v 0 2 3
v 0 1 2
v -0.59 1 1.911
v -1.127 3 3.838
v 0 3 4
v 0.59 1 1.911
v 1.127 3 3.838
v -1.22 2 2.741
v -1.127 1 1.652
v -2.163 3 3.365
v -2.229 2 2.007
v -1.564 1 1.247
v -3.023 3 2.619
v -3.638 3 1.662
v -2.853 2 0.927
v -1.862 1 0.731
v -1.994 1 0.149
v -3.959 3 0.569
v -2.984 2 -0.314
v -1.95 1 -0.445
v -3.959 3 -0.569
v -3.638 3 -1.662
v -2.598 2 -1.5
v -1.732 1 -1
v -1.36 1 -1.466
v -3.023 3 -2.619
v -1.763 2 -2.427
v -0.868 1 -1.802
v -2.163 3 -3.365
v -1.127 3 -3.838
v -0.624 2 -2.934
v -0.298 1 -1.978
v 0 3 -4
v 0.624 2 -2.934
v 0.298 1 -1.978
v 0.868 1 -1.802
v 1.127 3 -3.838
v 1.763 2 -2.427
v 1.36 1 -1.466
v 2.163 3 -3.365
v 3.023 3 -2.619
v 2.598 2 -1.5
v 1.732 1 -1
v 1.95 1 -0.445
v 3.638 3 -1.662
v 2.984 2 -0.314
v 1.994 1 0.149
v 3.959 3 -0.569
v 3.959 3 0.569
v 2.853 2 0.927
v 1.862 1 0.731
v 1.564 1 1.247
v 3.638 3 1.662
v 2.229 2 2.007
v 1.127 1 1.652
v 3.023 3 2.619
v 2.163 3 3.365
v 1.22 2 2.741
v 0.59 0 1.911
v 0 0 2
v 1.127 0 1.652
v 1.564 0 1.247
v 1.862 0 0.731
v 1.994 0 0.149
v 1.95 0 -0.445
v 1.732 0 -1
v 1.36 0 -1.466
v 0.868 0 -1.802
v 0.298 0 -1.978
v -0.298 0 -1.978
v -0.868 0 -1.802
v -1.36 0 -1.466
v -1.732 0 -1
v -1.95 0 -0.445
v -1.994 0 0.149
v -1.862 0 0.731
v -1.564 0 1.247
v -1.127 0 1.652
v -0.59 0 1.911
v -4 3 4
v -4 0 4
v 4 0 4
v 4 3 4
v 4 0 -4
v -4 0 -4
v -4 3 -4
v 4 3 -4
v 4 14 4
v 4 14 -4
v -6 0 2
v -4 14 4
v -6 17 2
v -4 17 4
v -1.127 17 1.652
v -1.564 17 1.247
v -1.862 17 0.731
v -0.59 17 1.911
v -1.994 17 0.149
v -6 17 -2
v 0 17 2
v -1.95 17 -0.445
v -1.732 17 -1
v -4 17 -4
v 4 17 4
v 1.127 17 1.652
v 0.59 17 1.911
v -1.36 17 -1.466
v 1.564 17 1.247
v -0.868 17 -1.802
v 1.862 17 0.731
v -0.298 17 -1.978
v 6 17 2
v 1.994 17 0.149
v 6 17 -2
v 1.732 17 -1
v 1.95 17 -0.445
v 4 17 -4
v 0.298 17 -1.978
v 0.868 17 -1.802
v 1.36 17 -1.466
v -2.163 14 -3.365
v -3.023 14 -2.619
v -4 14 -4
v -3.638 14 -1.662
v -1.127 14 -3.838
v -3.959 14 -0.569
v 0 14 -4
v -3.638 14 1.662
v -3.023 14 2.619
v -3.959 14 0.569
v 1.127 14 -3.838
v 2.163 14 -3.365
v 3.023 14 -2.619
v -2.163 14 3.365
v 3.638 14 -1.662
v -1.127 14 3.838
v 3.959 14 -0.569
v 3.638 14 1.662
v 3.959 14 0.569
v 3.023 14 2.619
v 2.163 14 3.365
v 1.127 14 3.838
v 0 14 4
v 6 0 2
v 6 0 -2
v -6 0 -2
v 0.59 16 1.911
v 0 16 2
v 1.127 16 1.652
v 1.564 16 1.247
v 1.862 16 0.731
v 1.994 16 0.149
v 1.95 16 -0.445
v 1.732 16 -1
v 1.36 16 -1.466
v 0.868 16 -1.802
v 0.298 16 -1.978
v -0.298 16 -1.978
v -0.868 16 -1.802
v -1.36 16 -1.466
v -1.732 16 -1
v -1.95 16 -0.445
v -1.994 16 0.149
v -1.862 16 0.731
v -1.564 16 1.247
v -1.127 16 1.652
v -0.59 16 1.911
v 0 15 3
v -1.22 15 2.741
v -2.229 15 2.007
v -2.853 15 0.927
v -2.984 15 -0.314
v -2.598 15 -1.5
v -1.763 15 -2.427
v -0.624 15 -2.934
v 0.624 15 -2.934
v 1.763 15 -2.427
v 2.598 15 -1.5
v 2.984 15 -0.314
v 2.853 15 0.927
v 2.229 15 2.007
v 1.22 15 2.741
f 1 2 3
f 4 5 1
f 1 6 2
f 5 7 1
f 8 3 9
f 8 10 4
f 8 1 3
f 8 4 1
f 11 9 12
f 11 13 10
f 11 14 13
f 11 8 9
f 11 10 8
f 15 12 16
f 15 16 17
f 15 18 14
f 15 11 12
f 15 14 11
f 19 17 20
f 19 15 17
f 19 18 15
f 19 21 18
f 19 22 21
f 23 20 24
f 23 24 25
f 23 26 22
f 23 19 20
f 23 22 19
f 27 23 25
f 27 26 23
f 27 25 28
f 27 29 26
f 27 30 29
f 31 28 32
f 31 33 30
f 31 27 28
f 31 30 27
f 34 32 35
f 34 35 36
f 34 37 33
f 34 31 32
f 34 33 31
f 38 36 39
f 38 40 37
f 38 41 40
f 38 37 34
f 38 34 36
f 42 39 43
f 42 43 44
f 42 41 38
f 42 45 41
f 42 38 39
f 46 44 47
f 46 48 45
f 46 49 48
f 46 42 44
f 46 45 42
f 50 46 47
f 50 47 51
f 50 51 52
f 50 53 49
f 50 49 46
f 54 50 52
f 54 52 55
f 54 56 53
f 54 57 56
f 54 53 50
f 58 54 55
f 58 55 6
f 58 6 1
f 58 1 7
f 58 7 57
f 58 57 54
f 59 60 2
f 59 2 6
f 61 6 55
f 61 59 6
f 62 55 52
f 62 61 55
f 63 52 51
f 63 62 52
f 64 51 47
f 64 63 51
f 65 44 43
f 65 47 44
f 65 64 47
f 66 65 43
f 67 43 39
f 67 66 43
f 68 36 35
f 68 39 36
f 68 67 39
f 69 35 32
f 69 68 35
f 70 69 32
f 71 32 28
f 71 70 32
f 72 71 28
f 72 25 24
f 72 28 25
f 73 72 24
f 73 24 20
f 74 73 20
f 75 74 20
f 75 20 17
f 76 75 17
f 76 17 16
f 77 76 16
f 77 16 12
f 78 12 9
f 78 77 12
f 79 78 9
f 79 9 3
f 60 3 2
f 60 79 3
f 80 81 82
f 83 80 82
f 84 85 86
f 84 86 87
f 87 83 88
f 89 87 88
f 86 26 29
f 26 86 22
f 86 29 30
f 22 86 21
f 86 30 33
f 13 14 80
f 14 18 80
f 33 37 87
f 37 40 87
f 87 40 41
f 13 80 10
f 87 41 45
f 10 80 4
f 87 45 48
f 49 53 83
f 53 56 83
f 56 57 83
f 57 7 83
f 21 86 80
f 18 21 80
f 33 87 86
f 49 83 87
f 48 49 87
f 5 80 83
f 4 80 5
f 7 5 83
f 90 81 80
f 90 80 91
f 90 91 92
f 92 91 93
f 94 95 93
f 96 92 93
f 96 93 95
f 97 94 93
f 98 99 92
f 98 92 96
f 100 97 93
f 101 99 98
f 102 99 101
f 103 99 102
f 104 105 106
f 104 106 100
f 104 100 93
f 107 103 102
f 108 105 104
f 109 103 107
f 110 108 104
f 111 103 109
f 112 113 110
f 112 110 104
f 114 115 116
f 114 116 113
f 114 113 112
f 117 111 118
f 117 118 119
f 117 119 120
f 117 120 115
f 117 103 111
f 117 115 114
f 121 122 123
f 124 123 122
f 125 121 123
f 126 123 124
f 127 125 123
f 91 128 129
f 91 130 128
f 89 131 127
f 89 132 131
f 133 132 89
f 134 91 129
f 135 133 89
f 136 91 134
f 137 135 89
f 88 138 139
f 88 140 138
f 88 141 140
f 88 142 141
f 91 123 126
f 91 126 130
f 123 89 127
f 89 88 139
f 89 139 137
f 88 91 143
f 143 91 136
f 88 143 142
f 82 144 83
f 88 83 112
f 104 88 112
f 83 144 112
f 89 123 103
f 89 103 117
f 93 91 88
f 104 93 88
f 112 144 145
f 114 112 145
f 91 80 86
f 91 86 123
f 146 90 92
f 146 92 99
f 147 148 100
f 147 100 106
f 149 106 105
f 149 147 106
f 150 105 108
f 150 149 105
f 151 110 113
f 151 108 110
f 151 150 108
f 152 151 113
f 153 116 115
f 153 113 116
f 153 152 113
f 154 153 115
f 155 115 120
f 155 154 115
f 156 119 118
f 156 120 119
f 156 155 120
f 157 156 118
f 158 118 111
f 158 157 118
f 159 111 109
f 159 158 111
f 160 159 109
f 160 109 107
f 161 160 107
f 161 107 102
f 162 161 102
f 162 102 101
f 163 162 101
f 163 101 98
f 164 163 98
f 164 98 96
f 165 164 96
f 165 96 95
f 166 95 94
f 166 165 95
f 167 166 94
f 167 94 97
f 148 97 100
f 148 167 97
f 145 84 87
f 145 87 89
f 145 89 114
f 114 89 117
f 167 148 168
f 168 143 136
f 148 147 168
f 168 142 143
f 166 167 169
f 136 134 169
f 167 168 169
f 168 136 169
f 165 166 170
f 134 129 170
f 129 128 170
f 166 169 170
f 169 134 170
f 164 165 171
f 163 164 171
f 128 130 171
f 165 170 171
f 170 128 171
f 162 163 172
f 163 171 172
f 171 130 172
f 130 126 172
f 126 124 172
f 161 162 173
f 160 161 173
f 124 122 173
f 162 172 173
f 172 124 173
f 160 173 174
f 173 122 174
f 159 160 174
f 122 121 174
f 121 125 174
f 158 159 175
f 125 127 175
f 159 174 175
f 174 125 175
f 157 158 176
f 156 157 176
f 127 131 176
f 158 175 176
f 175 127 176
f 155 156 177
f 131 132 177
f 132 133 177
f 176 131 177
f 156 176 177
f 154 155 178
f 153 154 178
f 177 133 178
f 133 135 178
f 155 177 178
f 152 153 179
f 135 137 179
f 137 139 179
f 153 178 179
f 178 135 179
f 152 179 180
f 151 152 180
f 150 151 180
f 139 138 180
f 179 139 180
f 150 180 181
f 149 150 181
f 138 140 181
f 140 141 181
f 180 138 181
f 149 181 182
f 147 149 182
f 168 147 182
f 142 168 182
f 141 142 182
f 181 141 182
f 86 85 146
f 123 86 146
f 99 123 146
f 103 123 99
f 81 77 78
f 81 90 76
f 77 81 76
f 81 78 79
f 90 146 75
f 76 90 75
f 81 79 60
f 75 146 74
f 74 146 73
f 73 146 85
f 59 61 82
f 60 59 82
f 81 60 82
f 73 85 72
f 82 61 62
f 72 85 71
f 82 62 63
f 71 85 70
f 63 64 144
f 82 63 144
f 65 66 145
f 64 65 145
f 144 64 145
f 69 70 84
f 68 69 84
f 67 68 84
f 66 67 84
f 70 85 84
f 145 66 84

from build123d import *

# Parameters (mm, degrees)
SKETCH_1_W               = 12
SKETCH_1_H               = 8
EXTRUDE_1_DEPTH          = 17
CHAMFER_1_SIZE           = 2
SKETCH_3_W               = 8
SKETCH_3_H               = 11
CUT_EXTRUDE_1_DEPTH      = 84.5
CUT_EXTRUDE_2_DEPTH      = 19.466185313
CUT_EXTRUDE_2_DEPTH_BACK = 19.466185313
SKETCH_4_R               = 2
CHAMFER_2_SIZE           = 2


with BuildPart() as part:
    # 草图1 → 凸台-拉伸1 (new body)
    with BuildSketch(Plane(origin=(0, 0, 0), x_dir=(1, 0, 0), z_dir=(0, 1, 0))):
        Rectangle(SKETCH_1_W, SKETCH_1_H)
    extrude(amount=EXTRUDE_1_DEPTH)

    # 倒角1
    chamfer_1_edges = [part.edges().sort_by_distance(p)[0] for p in [
        (6, 8.5, 4),
        (-6, 8.5, 4),
        (-6, 8.5, -4),
        (6, 8.5, -4),
    ]]
    chamfer(chamfer_1_edges, length=CHAMFER_1_SIZE)

    # 草图3 → 切除-拉伸1 (cut, symmetric)
    with BuildSketch(Plane.XY.offset(4)):
        with Locations((0, 8.5)):
            Rectangle(SKETCH_3_W, SKETCH_3_H)
    extrude(amount=CUT_EXTRUDE_1_DEPTH, both=True, mode=Mode.SUBTRACT)

    # 草图4 → 切除-拉伸2 (cut, two sides: drawn at the far end of the back side and taken through both)
    with BuildSketch(Plane(origin=(0, 17, 0), x_dir=(1, 0, 0), z_dir=(0, 1, 0)).offset(-CUT_EXTRUDE_2_DEPTH_BACK)):
        with Locations(Location((0, 0, 0), (0, 0, 270))):
            Circle(SKETCH_4_R)
    extrude(amount=CUT_EXTRUDE_2_DEPTH + CUT_EXTRUDE_2_DEPTH_BACK, mode=Mode.SUBTRACT)

    # 倒角2
    chamfer_2_edges = [part.edges().sort_by_distance(p)[0] for p in [
        (0, 3, -2),
        (0, 14, -2),
    ]]
    chamfer(chamfer_2_edges, length=CHAMFER_2_SIZE - 0.0001)  # a hair under: the kernel refuses the full size


solid = part.part
